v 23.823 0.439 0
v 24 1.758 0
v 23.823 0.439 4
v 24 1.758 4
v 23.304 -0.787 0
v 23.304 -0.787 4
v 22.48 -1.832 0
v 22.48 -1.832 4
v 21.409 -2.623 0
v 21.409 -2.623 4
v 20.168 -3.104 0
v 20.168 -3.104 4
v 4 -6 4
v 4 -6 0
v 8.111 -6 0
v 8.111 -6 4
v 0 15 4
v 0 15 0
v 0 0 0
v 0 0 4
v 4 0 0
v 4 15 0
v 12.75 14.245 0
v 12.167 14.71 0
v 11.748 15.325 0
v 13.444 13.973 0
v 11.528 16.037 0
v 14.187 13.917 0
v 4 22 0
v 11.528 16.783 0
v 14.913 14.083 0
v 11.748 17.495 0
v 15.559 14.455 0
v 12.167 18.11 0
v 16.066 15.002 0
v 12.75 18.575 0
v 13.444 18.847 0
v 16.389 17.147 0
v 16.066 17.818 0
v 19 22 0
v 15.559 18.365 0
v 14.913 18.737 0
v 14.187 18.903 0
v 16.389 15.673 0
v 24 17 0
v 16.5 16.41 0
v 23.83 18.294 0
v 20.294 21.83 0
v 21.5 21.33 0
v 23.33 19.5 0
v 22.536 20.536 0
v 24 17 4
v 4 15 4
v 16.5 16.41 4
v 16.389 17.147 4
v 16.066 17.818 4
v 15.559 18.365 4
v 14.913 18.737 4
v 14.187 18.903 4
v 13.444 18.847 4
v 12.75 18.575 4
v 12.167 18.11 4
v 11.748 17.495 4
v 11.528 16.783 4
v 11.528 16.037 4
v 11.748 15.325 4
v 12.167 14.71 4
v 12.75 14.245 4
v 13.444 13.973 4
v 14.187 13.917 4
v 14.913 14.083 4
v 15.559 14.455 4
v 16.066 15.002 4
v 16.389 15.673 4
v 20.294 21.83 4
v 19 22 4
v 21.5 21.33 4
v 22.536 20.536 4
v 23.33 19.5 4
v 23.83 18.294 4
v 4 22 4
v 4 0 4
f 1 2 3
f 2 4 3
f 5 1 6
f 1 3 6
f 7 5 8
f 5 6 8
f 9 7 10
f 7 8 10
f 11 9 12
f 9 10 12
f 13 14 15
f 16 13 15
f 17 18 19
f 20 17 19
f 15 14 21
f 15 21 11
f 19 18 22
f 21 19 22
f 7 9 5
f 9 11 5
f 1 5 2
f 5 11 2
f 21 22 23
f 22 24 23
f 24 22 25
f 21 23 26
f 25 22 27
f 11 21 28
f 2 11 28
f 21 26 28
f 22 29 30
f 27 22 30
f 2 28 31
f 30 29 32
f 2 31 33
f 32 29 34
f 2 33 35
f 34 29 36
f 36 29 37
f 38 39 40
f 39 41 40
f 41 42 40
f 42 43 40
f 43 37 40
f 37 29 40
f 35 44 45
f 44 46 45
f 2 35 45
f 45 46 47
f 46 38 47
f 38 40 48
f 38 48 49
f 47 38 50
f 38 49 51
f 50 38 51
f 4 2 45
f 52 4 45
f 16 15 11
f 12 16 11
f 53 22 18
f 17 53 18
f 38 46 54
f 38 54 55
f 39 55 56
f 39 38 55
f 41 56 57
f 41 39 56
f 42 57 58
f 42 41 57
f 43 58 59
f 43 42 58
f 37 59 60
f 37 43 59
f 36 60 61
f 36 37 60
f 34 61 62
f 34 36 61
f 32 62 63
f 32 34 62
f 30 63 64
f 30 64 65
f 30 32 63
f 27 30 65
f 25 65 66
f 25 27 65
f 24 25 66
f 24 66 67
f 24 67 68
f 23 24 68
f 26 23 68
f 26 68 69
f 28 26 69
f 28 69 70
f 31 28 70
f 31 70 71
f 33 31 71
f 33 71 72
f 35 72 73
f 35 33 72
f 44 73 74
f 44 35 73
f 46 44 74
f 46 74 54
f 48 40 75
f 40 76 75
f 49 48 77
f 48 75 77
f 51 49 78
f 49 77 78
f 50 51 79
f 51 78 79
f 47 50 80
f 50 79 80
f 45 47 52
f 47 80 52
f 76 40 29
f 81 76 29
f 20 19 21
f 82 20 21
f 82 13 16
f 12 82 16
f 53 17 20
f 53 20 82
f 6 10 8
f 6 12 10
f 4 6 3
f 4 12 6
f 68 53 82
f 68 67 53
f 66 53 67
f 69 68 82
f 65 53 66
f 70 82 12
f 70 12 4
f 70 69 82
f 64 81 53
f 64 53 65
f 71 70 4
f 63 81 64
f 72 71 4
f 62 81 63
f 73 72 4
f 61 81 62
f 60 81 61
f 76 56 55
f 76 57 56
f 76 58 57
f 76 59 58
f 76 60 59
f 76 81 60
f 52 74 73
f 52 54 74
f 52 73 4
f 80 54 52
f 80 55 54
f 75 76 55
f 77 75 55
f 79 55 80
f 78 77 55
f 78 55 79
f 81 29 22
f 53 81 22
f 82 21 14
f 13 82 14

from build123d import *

# Parameters (mm, degrees)
SKETCH_1_R      = 2.5
EXTRUDE_1_DEPTH = 4
FILLET_1_R      = 5


with BuildPart() as part:
    # ｽｹｯﾁ1 → ﾎﾞｽ - 押し出し1 (new body)
    with BuildSketch(Plane.XY):
        Polygon((0, 15), (0, 0), (4, 0), (4, -6), (8.110763801, -6), (24, -2.18322685), (24, 22), (4, 22), (4, 15), align=None)
        with Locations((14, 16.41)):
            Circle(SKETCH_1_R, mode=Mode.SUBTRACT)
    extrude(amount=EXTRUDE_1_DEPTH)

    # ﾌｨﾚｯﾄ1
    fillet_1_edges = [part.edges().sort_by_distance(p)[0] for p in [
        (24, 22, 2),
        (24, -2.18322685, 2),
    ]]
    fillet(fillet_1_edges, radius=FILLET_1_R)


solid = part.part
